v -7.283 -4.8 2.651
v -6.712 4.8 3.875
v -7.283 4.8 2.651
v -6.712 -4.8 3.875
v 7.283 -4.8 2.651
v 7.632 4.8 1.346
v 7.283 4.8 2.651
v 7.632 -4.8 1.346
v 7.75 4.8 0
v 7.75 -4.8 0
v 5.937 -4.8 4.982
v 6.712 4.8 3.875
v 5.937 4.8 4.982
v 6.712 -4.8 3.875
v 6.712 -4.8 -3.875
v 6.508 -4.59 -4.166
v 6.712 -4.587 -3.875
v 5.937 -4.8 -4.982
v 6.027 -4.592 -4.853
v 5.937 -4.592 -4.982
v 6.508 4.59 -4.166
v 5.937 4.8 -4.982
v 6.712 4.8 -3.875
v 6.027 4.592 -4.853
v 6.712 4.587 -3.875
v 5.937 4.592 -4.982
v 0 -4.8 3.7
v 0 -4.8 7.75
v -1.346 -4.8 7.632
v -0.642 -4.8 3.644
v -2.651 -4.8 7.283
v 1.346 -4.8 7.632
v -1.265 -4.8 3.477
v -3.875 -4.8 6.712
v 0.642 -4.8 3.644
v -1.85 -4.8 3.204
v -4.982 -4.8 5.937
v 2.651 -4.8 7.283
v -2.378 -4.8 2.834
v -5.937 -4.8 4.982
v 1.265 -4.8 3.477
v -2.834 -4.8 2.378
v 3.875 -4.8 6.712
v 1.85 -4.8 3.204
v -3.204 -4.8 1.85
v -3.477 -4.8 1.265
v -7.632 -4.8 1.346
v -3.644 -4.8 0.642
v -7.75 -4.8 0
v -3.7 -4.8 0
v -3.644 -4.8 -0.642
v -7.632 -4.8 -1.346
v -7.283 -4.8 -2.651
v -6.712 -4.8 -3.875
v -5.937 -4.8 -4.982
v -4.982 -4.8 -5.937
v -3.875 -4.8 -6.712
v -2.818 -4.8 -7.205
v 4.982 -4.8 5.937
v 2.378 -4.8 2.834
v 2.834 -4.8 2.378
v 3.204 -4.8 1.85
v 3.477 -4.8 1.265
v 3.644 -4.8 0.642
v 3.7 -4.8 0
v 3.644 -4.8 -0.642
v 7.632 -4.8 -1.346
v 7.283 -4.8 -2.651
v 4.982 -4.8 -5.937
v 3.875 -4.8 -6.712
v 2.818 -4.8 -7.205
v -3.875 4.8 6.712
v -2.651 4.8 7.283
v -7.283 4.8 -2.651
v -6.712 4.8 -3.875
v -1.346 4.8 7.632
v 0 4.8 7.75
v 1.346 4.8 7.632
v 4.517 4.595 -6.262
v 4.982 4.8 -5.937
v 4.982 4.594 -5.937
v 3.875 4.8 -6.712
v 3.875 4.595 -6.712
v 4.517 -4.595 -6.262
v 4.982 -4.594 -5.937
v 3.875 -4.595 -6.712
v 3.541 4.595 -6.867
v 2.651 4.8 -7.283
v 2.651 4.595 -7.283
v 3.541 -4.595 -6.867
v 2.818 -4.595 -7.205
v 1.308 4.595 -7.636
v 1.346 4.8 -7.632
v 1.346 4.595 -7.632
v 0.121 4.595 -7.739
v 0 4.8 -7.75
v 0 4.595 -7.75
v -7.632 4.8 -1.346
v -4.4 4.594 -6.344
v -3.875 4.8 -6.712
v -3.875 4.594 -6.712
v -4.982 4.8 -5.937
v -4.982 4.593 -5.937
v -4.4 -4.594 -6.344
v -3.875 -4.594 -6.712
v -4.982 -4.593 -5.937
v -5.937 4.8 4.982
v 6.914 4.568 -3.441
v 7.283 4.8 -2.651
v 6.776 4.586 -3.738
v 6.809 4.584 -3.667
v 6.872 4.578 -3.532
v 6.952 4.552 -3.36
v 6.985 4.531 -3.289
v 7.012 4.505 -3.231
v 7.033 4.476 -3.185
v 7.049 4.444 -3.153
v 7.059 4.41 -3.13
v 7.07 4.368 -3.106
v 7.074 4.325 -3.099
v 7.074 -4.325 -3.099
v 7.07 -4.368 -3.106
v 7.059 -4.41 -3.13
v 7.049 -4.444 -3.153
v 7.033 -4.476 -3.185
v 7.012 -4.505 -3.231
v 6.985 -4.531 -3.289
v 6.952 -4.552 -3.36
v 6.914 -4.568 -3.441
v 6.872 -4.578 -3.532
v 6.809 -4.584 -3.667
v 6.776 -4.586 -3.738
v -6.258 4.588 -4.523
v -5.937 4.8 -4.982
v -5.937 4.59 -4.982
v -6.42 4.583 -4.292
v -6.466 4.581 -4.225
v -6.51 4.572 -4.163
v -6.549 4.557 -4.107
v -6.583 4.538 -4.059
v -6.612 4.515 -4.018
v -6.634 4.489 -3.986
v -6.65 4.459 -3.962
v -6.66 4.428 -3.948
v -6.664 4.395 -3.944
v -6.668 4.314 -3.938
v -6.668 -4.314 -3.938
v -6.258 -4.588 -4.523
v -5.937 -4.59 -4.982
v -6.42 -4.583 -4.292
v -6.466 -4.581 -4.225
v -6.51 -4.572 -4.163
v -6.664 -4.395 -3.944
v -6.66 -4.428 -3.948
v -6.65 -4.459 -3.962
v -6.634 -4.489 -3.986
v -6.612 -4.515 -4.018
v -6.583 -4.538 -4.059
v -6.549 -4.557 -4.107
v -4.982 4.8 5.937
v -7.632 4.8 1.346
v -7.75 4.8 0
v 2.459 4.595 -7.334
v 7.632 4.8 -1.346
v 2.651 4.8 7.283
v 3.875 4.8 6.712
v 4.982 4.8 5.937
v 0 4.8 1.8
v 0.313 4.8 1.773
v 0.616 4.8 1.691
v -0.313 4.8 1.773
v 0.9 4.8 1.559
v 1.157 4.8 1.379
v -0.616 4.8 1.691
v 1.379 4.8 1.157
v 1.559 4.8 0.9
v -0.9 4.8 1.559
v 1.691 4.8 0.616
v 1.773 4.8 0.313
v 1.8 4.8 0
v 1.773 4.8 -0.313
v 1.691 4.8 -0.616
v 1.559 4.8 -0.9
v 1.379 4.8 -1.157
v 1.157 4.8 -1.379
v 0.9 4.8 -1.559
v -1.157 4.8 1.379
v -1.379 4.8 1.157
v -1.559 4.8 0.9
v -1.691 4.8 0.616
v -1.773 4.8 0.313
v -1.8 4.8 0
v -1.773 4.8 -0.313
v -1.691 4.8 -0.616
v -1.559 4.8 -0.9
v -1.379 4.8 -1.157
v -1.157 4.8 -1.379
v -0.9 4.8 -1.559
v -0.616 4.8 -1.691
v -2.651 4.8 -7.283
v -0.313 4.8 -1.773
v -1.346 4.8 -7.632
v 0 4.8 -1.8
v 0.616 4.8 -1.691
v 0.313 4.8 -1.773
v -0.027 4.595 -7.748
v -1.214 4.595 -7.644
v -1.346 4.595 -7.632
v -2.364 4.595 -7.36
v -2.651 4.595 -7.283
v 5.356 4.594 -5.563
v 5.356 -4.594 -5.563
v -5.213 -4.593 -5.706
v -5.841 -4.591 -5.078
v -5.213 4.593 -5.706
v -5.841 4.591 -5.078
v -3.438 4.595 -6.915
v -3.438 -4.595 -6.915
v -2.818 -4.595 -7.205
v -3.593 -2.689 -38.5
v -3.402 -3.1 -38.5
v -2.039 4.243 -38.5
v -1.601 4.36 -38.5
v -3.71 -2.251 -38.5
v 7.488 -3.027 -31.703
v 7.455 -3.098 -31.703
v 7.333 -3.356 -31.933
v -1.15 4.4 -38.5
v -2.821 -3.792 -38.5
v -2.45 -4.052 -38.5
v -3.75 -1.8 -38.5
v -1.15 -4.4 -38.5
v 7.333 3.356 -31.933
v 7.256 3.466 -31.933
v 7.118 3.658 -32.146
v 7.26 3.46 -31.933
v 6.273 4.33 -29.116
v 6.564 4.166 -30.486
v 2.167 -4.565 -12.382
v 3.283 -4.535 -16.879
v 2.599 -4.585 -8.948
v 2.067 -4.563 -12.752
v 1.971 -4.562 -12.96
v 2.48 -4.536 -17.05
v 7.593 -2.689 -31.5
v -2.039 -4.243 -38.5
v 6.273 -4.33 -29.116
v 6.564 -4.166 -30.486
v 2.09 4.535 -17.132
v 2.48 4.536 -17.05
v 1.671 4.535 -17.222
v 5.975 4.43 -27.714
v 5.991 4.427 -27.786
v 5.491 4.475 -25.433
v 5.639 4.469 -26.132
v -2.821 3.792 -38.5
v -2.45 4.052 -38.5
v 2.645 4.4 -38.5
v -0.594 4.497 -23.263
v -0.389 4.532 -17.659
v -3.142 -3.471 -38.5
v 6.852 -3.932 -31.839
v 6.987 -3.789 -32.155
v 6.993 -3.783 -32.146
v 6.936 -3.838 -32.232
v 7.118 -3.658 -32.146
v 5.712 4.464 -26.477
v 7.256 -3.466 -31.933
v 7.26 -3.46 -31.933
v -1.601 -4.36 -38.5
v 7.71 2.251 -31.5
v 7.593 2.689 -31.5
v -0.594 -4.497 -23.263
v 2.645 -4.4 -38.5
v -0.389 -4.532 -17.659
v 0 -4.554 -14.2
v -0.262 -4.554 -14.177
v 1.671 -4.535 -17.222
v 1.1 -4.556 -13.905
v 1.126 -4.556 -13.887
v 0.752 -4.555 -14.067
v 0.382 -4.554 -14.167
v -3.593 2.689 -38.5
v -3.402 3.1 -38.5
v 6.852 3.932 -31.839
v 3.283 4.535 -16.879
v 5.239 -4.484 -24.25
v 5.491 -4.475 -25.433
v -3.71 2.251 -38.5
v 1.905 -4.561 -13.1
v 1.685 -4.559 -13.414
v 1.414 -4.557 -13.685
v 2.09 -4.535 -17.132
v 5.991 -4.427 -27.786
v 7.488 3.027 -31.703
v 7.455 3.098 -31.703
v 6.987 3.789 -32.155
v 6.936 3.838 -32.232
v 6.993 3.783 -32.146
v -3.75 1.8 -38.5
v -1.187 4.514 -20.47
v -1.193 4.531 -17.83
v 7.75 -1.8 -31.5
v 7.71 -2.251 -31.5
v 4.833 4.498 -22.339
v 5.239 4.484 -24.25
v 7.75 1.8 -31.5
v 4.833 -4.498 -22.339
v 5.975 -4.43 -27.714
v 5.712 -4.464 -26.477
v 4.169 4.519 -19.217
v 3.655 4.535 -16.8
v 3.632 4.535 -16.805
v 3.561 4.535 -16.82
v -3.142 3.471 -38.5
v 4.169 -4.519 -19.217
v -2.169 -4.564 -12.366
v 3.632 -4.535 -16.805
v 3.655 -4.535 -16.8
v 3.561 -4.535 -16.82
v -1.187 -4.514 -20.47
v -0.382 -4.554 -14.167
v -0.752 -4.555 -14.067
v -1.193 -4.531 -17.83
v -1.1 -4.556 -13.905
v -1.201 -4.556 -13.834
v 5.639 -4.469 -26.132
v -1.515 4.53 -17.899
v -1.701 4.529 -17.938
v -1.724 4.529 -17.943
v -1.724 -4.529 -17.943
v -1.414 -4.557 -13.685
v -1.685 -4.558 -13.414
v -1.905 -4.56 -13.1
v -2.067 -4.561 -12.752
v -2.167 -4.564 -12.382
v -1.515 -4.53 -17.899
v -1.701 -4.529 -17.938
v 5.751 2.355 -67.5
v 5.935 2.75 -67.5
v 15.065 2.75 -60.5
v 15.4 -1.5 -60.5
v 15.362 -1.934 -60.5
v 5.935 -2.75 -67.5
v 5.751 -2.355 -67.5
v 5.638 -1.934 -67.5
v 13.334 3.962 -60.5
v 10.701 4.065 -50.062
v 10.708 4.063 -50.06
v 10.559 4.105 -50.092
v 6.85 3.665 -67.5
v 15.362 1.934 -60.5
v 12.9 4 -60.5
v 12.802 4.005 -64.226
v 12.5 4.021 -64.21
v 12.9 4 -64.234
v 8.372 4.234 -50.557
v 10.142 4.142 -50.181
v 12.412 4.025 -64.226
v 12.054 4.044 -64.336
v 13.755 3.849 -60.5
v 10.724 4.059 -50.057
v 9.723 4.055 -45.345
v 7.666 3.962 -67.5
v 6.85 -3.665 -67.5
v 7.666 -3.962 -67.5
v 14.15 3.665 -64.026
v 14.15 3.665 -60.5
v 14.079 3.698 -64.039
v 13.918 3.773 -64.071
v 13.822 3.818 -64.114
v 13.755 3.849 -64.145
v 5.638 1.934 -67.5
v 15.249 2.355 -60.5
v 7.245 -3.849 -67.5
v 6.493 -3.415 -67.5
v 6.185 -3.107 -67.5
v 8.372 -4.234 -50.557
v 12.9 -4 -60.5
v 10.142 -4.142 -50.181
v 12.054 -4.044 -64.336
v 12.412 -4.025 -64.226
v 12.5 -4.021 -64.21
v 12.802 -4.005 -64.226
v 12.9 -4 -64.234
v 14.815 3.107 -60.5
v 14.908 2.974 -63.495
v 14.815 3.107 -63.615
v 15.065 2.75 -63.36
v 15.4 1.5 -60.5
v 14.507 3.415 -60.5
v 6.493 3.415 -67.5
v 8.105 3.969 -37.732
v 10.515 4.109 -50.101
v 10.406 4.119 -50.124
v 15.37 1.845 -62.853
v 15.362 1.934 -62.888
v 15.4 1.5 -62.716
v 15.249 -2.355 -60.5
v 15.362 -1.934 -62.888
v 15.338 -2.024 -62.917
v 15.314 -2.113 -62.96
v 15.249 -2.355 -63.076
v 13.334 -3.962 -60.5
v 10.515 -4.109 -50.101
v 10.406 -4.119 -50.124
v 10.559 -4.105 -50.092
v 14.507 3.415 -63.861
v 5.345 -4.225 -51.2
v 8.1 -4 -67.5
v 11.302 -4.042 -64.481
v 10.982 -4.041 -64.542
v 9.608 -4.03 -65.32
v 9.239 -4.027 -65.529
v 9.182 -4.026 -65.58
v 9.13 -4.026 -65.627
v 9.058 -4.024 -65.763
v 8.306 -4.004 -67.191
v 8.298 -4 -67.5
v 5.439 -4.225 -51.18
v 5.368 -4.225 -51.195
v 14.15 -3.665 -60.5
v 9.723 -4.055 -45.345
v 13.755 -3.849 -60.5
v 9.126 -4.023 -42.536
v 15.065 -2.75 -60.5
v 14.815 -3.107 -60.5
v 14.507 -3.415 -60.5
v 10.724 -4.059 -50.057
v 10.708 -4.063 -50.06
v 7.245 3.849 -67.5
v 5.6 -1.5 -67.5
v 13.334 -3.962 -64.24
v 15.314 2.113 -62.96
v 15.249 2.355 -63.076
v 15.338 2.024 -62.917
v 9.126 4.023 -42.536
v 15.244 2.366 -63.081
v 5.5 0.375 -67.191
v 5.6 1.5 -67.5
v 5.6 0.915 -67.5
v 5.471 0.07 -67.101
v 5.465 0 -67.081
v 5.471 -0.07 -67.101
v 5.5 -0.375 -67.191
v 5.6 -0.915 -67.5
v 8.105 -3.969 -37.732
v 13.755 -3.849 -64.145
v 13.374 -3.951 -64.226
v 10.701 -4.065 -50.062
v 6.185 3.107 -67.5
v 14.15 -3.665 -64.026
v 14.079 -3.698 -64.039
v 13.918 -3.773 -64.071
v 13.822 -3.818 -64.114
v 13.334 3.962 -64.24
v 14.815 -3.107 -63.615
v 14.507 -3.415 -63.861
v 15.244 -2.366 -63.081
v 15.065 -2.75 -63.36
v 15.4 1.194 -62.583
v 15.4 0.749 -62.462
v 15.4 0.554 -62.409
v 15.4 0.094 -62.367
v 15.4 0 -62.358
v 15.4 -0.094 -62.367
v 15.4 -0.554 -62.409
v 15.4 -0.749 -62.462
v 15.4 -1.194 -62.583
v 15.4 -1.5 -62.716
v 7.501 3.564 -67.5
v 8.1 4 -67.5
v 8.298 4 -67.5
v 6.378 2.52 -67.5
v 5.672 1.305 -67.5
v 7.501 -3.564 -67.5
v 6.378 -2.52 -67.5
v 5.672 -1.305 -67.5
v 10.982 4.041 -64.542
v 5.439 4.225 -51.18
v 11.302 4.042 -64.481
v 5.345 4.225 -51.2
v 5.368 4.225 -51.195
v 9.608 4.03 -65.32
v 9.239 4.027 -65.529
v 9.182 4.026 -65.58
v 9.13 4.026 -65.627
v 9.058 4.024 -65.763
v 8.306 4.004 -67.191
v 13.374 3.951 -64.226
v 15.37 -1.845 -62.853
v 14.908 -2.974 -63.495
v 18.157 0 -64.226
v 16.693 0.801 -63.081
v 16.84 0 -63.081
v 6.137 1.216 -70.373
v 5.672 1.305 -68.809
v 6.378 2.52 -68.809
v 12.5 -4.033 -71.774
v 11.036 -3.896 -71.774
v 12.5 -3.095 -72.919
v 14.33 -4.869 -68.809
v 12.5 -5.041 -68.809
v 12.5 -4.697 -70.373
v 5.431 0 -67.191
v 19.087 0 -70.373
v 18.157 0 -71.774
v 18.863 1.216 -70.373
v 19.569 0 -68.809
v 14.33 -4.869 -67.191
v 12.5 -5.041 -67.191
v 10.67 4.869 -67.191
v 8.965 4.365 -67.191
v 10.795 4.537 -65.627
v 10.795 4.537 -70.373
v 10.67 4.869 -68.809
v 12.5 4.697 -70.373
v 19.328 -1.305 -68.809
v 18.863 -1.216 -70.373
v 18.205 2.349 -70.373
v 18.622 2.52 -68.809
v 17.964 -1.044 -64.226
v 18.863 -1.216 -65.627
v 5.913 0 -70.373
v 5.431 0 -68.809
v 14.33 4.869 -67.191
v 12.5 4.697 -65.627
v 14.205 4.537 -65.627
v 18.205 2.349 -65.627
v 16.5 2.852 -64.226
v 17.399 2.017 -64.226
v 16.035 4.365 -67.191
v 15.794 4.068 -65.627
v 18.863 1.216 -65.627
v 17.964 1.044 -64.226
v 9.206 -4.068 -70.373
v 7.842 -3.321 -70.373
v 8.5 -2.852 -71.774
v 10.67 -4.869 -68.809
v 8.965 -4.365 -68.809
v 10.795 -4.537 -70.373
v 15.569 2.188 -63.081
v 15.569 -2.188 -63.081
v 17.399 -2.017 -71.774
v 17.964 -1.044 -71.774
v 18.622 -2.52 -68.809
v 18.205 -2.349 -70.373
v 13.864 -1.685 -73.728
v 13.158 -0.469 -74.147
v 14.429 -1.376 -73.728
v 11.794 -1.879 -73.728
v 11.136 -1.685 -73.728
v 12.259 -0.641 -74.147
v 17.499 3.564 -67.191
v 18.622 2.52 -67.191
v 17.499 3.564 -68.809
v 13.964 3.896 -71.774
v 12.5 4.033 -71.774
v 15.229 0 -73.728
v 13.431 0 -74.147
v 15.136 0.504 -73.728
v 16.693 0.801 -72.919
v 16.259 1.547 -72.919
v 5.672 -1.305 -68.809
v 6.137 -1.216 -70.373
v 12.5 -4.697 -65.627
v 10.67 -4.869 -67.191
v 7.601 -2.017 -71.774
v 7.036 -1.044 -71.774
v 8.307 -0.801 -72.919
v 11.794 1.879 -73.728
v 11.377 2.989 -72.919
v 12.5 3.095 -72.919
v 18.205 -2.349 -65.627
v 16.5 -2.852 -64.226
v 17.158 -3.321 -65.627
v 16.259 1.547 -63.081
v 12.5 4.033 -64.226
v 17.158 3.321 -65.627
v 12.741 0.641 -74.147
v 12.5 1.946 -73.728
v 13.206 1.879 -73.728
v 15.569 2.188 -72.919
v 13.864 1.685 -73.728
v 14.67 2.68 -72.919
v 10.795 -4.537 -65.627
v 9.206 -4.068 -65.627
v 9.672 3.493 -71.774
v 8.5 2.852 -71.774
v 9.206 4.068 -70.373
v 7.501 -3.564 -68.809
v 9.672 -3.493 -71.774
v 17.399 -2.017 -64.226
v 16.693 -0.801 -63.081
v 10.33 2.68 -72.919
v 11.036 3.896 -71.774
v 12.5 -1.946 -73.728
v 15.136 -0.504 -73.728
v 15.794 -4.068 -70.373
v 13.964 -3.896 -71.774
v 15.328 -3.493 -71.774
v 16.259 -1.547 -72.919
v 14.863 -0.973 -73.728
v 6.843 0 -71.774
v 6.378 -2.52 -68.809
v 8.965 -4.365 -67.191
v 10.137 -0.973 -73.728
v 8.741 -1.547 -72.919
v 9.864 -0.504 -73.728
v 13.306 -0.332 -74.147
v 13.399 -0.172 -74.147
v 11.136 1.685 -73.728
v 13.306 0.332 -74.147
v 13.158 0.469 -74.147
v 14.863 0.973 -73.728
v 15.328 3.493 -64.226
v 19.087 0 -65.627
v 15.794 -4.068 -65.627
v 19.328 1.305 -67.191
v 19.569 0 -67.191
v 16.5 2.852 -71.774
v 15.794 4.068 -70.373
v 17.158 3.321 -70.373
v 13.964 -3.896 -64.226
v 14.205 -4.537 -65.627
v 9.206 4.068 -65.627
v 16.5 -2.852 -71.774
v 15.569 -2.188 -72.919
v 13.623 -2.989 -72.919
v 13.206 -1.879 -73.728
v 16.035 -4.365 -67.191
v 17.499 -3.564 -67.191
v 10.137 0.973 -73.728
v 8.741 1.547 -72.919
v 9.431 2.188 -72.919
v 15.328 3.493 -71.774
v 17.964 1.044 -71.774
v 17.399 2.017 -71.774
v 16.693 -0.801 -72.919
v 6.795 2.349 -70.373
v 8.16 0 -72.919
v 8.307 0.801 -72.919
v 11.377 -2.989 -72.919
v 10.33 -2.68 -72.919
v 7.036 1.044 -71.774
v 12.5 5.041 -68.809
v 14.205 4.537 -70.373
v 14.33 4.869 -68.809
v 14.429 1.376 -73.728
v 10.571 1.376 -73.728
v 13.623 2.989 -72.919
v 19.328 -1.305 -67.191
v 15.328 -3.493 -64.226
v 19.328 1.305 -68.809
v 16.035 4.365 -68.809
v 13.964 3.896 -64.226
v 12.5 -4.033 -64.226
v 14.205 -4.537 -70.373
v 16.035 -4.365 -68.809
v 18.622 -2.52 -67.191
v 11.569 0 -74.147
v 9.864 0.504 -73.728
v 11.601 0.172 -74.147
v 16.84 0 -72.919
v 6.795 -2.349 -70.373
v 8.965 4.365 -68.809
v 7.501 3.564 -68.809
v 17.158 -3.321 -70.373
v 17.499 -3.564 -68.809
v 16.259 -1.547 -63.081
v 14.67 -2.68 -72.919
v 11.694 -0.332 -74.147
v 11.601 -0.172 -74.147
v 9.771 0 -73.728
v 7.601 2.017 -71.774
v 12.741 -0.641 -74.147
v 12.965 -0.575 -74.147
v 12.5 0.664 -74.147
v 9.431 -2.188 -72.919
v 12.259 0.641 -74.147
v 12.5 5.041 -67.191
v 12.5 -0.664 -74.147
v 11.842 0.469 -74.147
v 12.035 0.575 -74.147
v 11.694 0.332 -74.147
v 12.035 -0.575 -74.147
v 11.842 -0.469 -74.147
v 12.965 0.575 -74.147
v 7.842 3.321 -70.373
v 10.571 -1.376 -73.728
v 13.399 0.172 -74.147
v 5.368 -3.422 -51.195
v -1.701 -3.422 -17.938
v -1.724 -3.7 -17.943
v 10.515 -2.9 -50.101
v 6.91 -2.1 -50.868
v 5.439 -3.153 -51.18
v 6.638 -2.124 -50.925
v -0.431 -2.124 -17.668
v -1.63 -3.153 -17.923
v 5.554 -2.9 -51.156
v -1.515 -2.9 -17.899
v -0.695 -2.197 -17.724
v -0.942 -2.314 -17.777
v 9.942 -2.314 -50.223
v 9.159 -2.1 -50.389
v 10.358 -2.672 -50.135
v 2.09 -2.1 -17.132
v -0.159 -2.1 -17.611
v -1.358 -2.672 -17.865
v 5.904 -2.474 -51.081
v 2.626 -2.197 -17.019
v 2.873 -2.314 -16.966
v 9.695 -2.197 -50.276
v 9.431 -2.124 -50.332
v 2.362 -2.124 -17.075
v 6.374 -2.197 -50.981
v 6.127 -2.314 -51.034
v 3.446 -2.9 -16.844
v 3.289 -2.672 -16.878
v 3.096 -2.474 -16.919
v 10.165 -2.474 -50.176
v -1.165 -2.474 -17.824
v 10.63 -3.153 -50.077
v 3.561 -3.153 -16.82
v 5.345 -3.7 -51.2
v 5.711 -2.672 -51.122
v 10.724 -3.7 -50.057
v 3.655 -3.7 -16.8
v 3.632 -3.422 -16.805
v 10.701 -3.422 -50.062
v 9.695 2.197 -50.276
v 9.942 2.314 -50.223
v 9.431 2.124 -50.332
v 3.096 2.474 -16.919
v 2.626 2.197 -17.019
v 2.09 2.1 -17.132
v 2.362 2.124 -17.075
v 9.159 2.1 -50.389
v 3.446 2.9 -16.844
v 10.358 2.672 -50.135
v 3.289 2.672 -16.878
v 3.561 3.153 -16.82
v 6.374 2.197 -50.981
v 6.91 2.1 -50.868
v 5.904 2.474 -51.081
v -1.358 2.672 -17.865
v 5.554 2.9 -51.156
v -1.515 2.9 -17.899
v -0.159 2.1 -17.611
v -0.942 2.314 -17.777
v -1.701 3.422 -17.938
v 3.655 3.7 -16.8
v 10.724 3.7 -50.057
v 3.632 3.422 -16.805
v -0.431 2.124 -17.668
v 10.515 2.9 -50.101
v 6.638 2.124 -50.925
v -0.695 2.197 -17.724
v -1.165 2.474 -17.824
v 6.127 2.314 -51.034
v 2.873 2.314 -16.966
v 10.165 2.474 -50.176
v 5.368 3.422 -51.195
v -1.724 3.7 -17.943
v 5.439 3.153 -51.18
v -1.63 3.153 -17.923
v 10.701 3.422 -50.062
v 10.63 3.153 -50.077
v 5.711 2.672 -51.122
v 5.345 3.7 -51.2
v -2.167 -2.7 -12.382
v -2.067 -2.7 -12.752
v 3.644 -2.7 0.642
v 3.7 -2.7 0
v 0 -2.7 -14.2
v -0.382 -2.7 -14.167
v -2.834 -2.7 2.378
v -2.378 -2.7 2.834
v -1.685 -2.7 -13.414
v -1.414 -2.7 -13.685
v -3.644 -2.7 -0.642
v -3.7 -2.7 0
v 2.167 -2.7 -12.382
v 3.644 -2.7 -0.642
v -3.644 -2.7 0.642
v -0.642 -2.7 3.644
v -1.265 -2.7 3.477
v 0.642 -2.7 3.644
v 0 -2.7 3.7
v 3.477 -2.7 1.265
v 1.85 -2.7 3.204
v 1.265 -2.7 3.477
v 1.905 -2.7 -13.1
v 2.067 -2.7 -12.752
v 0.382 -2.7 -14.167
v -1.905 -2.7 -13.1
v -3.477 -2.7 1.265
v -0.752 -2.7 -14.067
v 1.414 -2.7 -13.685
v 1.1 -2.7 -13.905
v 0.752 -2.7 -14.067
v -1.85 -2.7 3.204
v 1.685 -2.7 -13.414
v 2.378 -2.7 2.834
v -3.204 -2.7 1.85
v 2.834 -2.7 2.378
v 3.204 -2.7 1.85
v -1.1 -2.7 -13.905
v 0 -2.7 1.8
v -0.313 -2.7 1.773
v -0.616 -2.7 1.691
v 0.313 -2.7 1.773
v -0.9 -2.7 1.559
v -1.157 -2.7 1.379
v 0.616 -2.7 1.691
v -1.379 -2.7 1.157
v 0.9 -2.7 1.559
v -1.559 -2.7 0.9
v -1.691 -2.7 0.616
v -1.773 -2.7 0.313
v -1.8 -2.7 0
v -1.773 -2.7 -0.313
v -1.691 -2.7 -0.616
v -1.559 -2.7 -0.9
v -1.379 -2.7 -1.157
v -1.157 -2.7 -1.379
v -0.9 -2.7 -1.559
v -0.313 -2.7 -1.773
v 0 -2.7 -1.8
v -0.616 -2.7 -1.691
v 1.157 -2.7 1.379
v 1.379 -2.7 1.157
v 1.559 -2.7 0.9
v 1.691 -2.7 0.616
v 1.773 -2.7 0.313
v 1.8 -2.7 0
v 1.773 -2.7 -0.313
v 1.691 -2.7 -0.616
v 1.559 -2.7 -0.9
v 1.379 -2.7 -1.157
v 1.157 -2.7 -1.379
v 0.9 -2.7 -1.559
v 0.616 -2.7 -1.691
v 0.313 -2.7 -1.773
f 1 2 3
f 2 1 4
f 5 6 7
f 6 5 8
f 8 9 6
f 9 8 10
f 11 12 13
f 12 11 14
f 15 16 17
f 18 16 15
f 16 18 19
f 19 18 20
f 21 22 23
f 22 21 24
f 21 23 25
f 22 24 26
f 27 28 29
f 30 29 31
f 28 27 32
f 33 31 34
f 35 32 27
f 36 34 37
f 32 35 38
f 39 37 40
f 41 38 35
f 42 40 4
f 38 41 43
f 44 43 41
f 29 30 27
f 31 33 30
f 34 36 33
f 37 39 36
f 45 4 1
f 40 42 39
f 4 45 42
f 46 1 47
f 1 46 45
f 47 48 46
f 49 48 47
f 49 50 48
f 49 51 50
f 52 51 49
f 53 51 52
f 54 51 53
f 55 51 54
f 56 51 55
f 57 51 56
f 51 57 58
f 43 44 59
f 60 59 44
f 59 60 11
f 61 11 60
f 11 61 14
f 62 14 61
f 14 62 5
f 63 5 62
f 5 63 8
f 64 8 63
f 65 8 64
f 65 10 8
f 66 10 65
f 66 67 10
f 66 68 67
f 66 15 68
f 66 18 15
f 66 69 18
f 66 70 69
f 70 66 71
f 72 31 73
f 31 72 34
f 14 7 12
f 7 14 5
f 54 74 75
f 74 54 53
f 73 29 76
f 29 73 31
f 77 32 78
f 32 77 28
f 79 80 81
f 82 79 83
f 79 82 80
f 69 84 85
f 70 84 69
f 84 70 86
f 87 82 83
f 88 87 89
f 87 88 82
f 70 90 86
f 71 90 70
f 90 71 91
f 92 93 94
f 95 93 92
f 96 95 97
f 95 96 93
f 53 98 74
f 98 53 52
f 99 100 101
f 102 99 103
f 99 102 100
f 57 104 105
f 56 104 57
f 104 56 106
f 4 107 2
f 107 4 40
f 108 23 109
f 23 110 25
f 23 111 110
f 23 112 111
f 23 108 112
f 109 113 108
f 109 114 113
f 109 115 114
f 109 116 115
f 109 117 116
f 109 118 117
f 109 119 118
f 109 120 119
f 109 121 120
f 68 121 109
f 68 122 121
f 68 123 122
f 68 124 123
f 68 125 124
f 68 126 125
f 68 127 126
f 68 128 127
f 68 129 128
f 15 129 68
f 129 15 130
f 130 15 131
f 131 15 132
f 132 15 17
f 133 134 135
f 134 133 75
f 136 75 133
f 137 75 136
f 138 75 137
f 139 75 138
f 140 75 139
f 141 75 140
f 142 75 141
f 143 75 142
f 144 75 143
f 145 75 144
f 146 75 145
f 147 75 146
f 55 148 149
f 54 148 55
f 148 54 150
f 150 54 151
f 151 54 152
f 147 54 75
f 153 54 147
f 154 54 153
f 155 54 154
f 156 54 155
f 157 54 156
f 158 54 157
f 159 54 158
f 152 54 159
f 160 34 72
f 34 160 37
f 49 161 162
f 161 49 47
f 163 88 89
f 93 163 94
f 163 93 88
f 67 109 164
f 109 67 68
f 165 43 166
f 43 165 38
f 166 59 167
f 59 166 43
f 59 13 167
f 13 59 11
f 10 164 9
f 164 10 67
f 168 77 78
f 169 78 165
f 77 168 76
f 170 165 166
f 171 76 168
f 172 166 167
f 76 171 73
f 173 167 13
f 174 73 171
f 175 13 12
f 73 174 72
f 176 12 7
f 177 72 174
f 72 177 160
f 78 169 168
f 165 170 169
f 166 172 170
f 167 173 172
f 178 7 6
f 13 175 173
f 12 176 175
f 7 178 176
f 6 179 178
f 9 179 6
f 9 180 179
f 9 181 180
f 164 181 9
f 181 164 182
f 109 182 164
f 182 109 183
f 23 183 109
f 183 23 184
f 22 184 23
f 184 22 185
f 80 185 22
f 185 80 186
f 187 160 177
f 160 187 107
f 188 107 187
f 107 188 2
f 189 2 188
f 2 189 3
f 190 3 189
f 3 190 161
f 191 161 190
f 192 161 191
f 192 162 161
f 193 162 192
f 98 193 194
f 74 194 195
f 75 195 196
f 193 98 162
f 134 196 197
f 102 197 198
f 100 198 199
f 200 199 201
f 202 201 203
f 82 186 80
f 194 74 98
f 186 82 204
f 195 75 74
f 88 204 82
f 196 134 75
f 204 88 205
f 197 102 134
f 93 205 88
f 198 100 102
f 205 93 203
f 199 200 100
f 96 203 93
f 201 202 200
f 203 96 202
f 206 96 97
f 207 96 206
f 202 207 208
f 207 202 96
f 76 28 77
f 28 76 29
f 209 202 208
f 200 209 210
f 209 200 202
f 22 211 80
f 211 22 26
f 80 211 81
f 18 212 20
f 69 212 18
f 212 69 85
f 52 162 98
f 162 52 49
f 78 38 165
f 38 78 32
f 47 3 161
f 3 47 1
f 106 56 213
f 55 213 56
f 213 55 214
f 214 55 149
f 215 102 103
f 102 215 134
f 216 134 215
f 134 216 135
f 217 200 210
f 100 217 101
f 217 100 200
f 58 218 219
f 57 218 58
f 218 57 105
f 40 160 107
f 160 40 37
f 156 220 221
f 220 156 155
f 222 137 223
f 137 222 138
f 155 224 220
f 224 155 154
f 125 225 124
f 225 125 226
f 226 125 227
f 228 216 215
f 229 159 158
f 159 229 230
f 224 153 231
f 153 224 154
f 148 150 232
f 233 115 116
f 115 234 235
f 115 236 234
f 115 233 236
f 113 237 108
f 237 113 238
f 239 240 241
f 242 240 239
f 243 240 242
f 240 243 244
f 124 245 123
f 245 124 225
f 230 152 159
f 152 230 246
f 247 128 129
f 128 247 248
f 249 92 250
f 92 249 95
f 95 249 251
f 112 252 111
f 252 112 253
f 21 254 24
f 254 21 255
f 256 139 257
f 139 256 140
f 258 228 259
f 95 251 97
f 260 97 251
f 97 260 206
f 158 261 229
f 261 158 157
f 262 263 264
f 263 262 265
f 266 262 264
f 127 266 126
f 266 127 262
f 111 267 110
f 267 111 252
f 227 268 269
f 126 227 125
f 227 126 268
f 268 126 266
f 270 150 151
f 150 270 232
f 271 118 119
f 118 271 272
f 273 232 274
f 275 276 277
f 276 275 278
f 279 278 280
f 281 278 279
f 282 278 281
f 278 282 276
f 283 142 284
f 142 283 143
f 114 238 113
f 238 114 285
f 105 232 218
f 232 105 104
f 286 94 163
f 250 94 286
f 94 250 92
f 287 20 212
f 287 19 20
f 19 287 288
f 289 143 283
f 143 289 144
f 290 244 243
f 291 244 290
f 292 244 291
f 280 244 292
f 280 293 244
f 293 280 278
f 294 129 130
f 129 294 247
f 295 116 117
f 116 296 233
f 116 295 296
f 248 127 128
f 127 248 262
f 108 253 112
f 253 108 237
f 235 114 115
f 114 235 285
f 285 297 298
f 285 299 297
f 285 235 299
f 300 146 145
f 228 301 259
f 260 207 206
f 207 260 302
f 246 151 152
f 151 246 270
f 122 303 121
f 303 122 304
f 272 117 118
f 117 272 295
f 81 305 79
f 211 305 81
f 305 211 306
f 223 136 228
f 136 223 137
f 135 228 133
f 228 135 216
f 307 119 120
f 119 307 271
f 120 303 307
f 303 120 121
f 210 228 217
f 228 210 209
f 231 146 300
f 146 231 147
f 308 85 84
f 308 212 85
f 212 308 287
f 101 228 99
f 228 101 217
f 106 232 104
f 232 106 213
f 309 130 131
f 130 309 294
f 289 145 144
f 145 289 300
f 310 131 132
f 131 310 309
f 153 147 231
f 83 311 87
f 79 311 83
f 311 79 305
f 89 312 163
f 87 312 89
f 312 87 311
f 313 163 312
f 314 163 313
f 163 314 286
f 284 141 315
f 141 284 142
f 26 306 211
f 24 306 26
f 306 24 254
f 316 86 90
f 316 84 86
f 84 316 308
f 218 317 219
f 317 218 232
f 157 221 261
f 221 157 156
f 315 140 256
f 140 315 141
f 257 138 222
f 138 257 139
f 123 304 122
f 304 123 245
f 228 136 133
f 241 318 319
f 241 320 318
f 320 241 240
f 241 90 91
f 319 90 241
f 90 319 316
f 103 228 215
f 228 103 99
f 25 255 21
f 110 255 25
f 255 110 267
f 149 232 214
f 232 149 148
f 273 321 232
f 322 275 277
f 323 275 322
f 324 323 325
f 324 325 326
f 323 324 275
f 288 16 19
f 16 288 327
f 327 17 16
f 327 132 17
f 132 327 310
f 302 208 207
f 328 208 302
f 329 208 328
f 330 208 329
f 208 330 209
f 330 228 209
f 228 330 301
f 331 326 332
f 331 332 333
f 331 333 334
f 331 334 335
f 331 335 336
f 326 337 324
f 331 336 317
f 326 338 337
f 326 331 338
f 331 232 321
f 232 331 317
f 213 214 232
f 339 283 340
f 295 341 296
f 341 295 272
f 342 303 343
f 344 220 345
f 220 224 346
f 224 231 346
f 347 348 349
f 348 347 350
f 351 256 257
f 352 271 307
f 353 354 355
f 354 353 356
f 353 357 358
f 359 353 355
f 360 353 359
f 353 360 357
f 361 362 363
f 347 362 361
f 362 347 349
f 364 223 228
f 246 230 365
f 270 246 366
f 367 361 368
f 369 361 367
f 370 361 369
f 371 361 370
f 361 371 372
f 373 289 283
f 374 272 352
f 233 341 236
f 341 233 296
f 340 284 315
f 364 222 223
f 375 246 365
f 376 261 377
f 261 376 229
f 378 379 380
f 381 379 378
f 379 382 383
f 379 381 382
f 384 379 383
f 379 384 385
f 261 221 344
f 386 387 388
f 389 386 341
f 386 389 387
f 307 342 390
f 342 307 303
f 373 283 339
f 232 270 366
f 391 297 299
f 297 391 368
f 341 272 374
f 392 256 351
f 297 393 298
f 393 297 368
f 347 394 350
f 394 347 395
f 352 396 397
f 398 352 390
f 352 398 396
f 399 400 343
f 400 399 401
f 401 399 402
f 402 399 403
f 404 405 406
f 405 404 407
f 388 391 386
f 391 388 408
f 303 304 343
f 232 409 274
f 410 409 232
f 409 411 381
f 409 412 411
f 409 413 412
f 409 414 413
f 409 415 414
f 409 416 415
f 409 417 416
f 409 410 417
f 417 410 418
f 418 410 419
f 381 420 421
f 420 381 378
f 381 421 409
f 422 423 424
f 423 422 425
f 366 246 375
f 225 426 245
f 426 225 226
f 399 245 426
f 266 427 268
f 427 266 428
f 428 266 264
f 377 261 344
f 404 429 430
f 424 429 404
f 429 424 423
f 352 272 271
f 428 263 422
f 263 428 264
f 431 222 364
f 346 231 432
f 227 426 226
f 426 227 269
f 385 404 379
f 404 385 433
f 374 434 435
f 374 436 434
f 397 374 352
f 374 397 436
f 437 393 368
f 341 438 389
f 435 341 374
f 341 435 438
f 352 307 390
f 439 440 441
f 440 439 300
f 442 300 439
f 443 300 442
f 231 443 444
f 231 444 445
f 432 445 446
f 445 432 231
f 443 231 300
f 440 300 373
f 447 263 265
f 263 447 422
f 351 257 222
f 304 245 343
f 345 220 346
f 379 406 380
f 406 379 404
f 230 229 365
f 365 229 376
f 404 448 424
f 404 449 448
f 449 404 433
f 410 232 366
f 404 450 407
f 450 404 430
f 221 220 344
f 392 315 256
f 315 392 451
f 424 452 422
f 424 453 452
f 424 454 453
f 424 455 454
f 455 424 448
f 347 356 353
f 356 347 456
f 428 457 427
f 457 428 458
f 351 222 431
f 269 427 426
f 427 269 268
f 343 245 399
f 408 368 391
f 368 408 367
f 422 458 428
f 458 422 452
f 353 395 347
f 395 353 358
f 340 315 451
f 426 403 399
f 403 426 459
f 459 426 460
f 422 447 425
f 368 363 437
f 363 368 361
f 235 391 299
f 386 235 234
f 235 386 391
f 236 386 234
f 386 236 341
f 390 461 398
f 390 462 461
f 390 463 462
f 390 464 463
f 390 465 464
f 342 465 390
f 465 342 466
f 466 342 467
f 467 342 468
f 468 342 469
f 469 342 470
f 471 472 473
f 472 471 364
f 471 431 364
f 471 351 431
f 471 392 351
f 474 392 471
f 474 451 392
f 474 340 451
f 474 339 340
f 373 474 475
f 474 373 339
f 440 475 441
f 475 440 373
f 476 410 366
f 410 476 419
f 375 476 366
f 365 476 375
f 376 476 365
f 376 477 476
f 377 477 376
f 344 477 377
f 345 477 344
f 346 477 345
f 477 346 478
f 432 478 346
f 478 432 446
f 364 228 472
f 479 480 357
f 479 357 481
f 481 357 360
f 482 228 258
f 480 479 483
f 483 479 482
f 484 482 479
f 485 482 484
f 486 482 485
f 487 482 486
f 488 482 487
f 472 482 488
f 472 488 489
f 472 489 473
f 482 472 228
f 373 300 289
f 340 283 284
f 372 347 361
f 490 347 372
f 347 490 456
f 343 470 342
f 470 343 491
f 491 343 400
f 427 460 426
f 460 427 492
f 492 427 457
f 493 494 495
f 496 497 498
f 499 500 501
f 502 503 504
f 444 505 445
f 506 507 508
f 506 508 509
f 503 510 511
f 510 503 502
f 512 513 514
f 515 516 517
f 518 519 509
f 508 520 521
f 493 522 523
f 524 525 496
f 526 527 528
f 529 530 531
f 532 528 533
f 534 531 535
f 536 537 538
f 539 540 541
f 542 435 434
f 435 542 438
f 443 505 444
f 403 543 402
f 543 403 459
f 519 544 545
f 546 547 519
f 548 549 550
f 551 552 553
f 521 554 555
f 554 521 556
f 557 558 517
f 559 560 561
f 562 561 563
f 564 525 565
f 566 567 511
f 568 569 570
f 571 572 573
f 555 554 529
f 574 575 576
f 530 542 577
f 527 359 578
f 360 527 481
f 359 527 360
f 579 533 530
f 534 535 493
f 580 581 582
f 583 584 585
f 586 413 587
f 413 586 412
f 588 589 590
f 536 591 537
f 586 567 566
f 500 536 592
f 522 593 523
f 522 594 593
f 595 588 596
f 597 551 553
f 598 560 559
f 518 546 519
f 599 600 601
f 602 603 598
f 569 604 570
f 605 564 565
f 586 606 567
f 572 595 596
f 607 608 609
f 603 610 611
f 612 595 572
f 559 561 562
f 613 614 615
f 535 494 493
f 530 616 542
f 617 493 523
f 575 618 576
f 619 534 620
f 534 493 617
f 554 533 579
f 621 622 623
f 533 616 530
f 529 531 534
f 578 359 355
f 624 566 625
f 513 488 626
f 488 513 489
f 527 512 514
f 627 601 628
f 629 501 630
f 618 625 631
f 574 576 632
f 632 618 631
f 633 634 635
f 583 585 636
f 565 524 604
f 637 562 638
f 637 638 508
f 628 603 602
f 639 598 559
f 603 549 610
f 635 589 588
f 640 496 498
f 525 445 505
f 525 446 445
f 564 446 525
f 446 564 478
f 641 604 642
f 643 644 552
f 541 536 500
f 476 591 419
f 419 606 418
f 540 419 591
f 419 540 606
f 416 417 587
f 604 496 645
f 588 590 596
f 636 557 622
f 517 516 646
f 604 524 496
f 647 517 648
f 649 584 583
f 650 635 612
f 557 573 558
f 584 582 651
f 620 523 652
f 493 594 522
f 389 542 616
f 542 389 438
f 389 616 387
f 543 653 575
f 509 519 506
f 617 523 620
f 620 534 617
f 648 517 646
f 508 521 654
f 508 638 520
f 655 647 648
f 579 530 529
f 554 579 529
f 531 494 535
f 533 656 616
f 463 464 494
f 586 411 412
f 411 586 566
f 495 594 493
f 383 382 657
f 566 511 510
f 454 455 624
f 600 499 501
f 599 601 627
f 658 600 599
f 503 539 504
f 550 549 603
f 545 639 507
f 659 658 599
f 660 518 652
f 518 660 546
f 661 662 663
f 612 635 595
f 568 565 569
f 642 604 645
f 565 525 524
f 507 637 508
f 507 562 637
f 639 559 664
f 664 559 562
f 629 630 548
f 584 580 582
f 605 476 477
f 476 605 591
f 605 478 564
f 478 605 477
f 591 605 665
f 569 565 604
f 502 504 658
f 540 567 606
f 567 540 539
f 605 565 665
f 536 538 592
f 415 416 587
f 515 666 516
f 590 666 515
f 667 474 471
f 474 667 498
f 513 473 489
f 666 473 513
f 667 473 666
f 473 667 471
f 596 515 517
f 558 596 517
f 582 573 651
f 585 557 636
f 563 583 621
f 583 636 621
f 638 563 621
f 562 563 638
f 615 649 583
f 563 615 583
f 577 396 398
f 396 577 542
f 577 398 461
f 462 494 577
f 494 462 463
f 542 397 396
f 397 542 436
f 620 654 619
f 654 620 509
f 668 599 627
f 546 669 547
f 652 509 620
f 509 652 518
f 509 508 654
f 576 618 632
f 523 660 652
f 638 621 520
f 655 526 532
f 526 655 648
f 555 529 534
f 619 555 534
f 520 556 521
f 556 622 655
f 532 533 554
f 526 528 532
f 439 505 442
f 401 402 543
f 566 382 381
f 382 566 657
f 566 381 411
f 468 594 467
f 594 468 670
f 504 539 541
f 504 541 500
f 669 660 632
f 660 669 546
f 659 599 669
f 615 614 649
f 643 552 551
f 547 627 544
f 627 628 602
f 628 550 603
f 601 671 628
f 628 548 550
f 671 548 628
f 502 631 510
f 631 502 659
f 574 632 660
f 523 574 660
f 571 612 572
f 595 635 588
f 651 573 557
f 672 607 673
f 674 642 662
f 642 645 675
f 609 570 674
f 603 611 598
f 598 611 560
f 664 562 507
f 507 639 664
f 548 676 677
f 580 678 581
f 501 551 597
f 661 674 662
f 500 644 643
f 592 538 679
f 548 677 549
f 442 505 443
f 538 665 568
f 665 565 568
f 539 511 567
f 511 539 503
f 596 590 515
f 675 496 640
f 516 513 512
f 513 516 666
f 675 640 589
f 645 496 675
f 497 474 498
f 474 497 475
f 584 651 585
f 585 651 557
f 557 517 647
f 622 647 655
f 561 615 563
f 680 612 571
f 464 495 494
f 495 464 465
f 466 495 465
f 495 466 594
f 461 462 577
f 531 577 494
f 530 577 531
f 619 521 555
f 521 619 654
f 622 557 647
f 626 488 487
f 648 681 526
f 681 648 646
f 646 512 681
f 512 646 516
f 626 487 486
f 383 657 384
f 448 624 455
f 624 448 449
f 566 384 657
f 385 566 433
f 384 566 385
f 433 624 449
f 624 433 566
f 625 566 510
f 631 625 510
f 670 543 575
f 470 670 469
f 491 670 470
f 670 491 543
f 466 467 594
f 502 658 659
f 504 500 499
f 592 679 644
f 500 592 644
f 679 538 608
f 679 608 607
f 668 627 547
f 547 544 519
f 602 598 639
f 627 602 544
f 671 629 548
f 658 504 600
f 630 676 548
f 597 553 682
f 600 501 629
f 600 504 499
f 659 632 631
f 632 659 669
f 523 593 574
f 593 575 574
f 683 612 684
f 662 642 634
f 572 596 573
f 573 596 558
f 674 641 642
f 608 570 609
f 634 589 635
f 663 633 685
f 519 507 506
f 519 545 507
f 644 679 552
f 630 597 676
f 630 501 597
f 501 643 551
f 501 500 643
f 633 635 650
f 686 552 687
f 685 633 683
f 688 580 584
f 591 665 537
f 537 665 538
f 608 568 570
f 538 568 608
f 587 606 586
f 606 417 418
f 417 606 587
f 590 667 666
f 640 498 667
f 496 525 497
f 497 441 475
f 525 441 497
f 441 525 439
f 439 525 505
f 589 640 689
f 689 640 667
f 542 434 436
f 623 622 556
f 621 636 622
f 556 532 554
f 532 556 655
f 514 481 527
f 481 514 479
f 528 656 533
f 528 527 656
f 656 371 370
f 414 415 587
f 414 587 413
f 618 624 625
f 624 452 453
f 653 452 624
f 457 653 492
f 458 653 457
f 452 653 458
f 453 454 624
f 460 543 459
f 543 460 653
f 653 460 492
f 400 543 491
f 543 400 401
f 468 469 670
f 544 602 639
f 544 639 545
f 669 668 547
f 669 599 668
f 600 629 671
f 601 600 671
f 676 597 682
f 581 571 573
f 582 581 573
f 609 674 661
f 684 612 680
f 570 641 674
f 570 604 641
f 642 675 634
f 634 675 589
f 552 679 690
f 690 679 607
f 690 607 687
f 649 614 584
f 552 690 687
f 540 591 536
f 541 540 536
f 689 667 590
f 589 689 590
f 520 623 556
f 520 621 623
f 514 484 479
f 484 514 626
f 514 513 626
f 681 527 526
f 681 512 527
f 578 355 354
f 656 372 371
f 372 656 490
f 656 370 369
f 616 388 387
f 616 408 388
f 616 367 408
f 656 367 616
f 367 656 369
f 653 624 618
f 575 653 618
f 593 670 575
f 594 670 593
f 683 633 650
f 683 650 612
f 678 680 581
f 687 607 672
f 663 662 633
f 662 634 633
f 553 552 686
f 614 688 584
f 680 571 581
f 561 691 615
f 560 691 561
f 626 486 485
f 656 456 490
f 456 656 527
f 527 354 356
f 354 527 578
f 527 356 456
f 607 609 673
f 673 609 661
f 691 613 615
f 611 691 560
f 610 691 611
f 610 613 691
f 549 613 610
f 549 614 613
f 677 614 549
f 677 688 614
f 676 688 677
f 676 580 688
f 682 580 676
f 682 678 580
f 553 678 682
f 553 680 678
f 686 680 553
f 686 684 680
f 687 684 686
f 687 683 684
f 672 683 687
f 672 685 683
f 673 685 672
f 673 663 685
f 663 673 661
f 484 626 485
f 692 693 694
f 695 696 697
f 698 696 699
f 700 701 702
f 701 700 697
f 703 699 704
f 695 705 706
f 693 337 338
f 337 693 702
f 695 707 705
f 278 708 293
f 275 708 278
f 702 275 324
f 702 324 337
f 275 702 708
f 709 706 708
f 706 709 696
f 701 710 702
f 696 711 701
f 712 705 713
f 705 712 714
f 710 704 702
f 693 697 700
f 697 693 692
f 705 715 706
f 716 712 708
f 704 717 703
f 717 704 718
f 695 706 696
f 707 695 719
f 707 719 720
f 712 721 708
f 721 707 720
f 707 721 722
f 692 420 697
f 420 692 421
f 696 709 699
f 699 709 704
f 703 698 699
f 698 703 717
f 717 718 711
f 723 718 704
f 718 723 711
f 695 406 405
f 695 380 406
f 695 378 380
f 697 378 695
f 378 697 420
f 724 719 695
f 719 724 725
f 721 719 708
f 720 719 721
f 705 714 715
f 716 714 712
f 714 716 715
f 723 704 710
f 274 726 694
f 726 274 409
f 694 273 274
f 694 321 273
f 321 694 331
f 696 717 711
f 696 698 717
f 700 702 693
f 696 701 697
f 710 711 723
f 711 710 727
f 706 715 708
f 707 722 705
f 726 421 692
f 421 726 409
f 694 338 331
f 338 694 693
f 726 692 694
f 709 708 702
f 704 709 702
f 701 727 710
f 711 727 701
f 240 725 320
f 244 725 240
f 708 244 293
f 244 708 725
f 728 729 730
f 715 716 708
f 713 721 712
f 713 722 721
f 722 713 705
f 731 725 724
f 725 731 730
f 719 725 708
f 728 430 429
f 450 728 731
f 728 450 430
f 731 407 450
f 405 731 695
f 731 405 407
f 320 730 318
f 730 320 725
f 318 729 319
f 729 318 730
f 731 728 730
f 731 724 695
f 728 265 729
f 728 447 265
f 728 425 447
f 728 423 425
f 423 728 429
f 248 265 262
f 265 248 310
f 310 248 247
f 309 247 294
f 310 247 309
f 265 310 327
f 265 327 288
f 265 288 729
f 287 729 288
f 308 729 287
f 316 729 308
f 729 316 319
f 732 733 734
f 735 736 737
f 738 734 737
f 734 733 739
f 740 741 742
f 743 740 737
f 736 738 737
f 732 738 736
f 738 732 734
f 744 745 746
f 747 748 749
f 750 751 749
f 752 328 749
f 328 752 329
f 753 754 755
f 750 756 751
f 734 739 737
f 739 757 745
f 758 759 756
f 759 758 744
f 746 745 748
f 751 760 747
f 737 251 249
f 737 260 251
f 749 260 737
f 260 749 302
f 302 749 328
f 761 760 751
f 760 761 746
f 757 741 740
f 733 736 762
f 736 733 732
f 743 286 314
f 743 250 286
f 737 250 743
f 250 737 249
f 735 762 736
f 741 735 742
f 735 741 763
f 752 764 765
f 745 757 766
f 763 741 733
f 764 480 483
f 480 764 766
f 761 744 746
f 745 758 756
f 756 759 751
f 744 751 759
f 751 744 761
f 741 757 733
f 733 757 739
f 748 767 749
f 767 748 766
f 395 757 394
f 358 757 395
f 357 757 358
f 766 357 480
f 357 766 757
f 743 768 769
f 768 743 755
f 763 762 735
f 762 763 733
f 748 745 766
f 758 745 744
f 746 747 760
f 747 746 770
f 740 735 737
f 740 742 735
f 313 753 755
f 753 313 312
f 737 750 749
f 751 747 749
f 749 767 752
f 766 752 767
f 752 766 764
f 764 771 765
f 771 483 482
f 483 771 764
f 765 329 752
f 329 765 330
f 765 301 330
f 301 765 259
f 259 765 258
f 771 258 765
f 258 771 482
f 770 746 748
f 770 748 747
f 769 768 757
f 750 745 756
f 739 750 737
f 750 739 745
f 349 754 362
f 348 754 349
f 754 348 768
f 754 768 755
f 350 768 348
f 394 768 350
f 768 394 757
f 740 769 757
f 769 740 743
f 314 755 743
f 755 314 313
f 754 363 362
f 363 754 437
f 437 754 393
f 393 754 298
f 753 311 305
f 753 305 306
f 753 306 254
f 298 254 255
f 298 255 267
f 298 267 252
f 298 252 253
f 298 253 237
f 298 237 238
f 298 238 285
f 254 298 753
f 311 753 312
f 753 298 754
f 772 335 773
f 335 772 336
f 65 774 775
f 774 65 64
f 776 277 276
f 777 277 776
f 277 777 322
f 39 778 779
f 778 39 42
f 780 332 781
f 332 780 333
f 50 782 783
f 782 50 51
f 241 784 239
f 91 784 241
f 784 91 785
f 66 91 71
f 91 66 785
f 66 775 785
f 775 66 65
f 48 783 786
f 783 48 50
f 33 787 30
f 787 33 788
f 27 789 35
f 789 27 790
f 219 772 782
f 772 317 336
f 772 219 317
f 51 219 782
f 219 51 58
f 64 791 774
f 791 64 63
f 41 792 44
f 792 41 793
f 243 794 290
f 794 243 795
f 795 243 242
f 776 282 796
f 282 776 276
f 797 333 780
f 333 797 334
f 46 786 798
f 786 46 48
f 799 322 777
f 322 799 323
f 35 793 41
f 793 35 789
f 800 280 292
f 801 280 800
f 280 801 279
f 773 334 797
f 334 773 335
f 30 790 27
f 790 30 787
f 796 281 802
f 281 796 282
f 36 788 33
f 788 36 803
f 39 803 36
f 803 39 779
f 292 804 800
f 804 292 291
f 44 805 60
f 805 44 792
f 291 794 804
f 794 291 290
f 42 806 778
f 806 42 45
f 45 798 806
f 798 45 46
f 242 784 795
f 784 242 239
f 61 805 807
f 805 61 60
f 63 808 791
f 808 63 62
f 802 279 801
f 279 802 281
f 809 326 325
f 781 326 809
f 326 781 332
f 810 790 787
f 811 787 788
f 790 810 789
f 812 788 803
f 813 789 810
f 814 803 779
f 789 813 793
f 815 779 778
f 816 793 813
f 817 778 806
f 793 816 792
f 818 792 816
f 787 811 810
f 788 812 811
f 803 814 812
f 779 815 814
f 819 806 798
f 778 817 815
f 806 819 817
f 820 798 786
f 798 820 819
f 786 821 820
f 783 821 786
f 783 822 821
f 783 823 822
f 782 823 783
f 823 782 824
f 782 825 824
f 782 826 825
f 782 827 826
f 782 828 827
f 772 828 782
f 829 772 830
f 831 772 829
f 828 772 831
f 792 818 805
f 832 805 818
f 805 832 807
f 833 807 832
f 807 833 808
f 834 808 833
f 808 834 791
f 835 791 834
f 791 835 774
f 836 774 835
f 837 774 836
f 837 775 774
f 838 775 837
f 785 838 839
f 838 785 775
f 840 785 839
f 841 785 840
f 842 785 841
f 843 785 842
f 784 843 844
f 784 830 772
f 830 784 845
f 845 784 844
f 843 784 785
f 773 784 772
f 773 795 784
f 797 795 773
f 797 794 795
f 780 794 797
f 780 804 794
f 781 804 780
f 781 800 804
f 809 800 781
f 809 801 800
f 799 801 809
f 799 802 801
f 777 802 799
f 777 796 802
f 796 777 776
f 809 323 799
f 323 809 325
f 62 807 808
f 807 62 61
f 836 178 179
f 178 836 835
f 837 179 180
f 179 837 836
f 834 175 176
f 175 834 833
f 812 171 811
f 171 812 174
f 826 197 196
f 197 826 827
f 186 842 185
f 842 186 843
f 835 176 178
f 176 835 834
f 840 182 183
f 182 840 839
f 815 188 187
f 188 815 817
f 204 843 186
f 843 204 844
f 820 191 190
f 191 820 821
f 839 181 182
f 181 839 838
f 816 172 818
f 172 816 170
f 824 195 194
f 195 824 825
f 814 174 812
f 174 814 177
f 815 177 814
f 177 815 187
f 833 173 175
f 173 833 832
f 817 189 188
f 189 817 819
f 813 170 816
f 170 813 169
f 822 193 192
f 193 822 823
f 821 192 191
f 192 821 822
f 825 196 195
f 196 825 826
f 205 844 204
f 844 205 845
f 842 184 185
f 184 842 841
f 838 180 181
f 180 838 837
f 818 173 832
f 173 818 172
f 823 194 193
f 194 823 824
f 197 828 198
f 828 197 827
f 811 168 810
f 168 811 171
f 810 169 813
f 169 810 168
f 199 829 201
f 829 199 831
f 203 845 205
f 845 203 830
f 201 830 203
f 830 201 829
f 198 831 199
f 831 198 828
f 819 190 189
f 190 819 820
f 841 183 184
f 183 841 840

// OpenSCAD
// file: ../rnv1_params.scad
// RNV1 (Robotic Neural Vector 1) - Master Parametric Mechanical Specification
// Units: millimeters (mm)
// Coordinate Frame: +X Forward, +Y Left, +Z Up (Standing Neutral Pose, Floor = Z=0)

$fn = 36;

// --- FDM 3D Print Engineering Tolerances (0.4mm nozzle, PETG / PLA+) ---
WALL_T       = 2.0;    // Primary structural wall thickness (>= 1.6mm requirement)
RIB_T        = 1.8;    // Structural stiffening rib thickness
CLEARANCE    = 0.25;   // Standard FDM press/slip fit clearance
M2_PILOT_D   = 1.75;   // M2 self-tapping pilot hole diameter
M2_CLEAR_D   = 2.3;    // M2 through clearance hole diameter
PIVOT_BOSS_D = 4.0;    // Dual-shear opposing coaxial pivot pin diameter

// --- MG90S Metal-Gear Micro Servo Envelope (TowerPro/Generic standard) ---
MG90S_L      = 22.8;   // Body length along flange axis
MG90S_W      = 12.2;   // Body width
MG90S_H      = 28.5;   // Total housing height (bottom to top gear dome)
MG90S_FLANGE_L = 32.2; // Mounting ear span
MG90S_HOLE_DX  = 27.6; // Mounting hole center-to-center
MG90S_SHAFT_OFF = 5.9; // Output shaft offset from end of 22.8mm body

// --- SG90 9g Micro Servo Envelope ---
SG90_L       = 22.5;
SG90_W       = 12.0;
SG90_H       = 22.5;

// --- Master Kinematic Skeleton Coordinates (mm, Z from Floor = 0) ---
SOLE_PAD_H   = 2.0;    // 2mm silicone anti-slip pad (1mm recessed)
FOOT_L       = 72.0;   // X: -32mm heel to +40mm toe
FOOT_HEEL_X  = -32.0;
FOOT_TOE_X   = 40.0;
FOOT_W       = 46.0;   // Y width per foot
FOOT_PLATE_H = 6.5;    // Rigid foot sole plate thickness

FOOT_Y_CTR   = 26.0;   // Left=+26mm, Right=-26mm (6mm gap between inner edges!)
HIP_ROLL_Y   = 23.0;   // Left=+23mm, Right=-23mm

Z_ANKLE_ROLL = 18.0;   // Ankle roll axis height
Z_KNEE_PITCH = 62.0;   // Knee pitch axis height  (L_shin = 44.0mm)
Z_HIP_PITCH  = 106.0;  // Hip pitch axis height   (L_thigh = 44.0mm)
Z_HIP_ROLL   = 124.0;  // Hip roll axis height    (dZ = 18.0mm)

L_SHIN       = Z_KNEE_PITCH - Z_ANKLE_ROLL; // 44.0 mm
L_THIGH      = Z_HIP_PITCH - Z_KNEE_PITCH;  // 44.0 mm
L_HIP_CLEVIS = Z_HIP_ROLL - Z_HIP_PITCH;    // 18.0 mm

// --- Torso & Pelvis Envelope ---
TORSO_Z_BOT  = 116.0;
TORSO_Z_TOP  = 184.0;
TORSO_H      = TORSO_Z_TOP - TORSO_Z_BOT;   // 68.0 mm
TORSO_W      = 80.0;   // Y: -40 to +40mm
TORSO_D      = 54.0;   // X: -27 to +27mm

// --- Arms ---
SHOULDER_Y   = 46.0;   // Left=+46mm, Right=-46mm
SHOULDER_Z   = 170.0;
ARM_LEN      = 72.0;   // Shoulder to palm tip

// --- 2-DOF Active Spatial Head ---
Z_HEAD_YAW   = 188.0;  // Pan axis Z
Z_HEAD_PITCH = 204.0;  // Tilt axis Z
HEAD_W       = 58.0;   // Y width
HEAD_D       = 44.0;   // X depth
HEAD_H       = 42.0;   // Z height (Z = 196..238mm -> Total Robot Height = 238mm)
HEAD_Z_CTR   = 217.0;

// --- Utility Rounded Box Module ---
module rbox(size, r=2.0, center=true) {
    sx = size[0]; sy = size[1]; sz = size[2];
    rc = min(r, sx/2 - 0.1, sy/2 - 0.1, sz/2 - 0.1);
    translate(center ? [0,0,0] : [sx/2, sy/2, sz/2])
    hull() {
        for (dx = [-sx/2 + rc, sx/2 - rc])
        for (dy = [-sy/2 + rc, sy/2 - rc])
        for (dz = [-sz/2 + rc, sz/2 - rc])
            translate([dx, dy, dz]) sphere(r=rc, $fn=16);
    }
}

module rbox_xy(size, r=2.5, center=true) {
    sx = size[0]; sy = size[1]; sz = size[2];
    rc = min(r, sx/2 - 0.1, sy/2 - 0.1);
    translate(center ? [0,0,0] : [sx/2, sy/2, sz/2])
    linear_extrude(height=sz, center=true)
    offset(r=rc) offset(r=-rc)
        square([sx, sy], center=true);
}
// main file
// RNV1 Part: Lightweight Ribbed Sculpted Humanoid Arm Link (~5.2g each)
include <../rnv1_params.scad>

module arm_link() {
    difference() {
        union() {
            // Shoulder hub
            rotate([90, 0, 0])
                cylinder(d=15.5, h=9.6, center=true);

            // Upper arm tapered strut (Z = 0 to -35mm)
            hull() {
                rotate([90, 0, 0])
                    cylinder(d=14.0, h=9.2, center=true);
                translate([2.0, 0, -35.0])
                    rbox_xy([11.5, 8.8, 7.0], r=2.6, center=true);
            }

            // Forearm ergonomic 15-deg forward curve (Z = -35 to -65mm)
            hull() {
                translate([2.0, 0, -35.0])
                    rbox_xy([11.5, 8.8, 7.0], r=2.6, center=true);
                translate([10.5, 0, -64.0])
                    rbox_xy([9.8, 8.0, 7.0], r=2.5, center=true);
            }

            // Rounded tactile palm bumper
            translate([12.5, 0, -68.0])
                scale([1.15, 0.82, 1.0])
                    sphere(r=6.2, $fn=24);
        }

        // MG90S Horn Recess Pocket on inner shoulder face
        translate([0, -4.0, 0])
            rotate([90, 0, 0])
                hull() {
                    cylinder(d=7.4, h=2.6, center=true);
                    translate([0, -12.0, 0]) cylinder(d=4.4, h=2.6, center=true);
                }
        rotate([90, 0, 0])
            cylinder(d=3.6, h=14.0, center=true);

        // Dual-side I-beam weight-relief pockets along arm
        for (sy = [-4.2, 4.2]) {
            translate([4.5, sy, -34.0])
                rotate([0, -12, 0])
                    rbox_xy([5.5, 4.2, 34.0], r=1.6, center=true);
        }
    }
}

arm_link();
